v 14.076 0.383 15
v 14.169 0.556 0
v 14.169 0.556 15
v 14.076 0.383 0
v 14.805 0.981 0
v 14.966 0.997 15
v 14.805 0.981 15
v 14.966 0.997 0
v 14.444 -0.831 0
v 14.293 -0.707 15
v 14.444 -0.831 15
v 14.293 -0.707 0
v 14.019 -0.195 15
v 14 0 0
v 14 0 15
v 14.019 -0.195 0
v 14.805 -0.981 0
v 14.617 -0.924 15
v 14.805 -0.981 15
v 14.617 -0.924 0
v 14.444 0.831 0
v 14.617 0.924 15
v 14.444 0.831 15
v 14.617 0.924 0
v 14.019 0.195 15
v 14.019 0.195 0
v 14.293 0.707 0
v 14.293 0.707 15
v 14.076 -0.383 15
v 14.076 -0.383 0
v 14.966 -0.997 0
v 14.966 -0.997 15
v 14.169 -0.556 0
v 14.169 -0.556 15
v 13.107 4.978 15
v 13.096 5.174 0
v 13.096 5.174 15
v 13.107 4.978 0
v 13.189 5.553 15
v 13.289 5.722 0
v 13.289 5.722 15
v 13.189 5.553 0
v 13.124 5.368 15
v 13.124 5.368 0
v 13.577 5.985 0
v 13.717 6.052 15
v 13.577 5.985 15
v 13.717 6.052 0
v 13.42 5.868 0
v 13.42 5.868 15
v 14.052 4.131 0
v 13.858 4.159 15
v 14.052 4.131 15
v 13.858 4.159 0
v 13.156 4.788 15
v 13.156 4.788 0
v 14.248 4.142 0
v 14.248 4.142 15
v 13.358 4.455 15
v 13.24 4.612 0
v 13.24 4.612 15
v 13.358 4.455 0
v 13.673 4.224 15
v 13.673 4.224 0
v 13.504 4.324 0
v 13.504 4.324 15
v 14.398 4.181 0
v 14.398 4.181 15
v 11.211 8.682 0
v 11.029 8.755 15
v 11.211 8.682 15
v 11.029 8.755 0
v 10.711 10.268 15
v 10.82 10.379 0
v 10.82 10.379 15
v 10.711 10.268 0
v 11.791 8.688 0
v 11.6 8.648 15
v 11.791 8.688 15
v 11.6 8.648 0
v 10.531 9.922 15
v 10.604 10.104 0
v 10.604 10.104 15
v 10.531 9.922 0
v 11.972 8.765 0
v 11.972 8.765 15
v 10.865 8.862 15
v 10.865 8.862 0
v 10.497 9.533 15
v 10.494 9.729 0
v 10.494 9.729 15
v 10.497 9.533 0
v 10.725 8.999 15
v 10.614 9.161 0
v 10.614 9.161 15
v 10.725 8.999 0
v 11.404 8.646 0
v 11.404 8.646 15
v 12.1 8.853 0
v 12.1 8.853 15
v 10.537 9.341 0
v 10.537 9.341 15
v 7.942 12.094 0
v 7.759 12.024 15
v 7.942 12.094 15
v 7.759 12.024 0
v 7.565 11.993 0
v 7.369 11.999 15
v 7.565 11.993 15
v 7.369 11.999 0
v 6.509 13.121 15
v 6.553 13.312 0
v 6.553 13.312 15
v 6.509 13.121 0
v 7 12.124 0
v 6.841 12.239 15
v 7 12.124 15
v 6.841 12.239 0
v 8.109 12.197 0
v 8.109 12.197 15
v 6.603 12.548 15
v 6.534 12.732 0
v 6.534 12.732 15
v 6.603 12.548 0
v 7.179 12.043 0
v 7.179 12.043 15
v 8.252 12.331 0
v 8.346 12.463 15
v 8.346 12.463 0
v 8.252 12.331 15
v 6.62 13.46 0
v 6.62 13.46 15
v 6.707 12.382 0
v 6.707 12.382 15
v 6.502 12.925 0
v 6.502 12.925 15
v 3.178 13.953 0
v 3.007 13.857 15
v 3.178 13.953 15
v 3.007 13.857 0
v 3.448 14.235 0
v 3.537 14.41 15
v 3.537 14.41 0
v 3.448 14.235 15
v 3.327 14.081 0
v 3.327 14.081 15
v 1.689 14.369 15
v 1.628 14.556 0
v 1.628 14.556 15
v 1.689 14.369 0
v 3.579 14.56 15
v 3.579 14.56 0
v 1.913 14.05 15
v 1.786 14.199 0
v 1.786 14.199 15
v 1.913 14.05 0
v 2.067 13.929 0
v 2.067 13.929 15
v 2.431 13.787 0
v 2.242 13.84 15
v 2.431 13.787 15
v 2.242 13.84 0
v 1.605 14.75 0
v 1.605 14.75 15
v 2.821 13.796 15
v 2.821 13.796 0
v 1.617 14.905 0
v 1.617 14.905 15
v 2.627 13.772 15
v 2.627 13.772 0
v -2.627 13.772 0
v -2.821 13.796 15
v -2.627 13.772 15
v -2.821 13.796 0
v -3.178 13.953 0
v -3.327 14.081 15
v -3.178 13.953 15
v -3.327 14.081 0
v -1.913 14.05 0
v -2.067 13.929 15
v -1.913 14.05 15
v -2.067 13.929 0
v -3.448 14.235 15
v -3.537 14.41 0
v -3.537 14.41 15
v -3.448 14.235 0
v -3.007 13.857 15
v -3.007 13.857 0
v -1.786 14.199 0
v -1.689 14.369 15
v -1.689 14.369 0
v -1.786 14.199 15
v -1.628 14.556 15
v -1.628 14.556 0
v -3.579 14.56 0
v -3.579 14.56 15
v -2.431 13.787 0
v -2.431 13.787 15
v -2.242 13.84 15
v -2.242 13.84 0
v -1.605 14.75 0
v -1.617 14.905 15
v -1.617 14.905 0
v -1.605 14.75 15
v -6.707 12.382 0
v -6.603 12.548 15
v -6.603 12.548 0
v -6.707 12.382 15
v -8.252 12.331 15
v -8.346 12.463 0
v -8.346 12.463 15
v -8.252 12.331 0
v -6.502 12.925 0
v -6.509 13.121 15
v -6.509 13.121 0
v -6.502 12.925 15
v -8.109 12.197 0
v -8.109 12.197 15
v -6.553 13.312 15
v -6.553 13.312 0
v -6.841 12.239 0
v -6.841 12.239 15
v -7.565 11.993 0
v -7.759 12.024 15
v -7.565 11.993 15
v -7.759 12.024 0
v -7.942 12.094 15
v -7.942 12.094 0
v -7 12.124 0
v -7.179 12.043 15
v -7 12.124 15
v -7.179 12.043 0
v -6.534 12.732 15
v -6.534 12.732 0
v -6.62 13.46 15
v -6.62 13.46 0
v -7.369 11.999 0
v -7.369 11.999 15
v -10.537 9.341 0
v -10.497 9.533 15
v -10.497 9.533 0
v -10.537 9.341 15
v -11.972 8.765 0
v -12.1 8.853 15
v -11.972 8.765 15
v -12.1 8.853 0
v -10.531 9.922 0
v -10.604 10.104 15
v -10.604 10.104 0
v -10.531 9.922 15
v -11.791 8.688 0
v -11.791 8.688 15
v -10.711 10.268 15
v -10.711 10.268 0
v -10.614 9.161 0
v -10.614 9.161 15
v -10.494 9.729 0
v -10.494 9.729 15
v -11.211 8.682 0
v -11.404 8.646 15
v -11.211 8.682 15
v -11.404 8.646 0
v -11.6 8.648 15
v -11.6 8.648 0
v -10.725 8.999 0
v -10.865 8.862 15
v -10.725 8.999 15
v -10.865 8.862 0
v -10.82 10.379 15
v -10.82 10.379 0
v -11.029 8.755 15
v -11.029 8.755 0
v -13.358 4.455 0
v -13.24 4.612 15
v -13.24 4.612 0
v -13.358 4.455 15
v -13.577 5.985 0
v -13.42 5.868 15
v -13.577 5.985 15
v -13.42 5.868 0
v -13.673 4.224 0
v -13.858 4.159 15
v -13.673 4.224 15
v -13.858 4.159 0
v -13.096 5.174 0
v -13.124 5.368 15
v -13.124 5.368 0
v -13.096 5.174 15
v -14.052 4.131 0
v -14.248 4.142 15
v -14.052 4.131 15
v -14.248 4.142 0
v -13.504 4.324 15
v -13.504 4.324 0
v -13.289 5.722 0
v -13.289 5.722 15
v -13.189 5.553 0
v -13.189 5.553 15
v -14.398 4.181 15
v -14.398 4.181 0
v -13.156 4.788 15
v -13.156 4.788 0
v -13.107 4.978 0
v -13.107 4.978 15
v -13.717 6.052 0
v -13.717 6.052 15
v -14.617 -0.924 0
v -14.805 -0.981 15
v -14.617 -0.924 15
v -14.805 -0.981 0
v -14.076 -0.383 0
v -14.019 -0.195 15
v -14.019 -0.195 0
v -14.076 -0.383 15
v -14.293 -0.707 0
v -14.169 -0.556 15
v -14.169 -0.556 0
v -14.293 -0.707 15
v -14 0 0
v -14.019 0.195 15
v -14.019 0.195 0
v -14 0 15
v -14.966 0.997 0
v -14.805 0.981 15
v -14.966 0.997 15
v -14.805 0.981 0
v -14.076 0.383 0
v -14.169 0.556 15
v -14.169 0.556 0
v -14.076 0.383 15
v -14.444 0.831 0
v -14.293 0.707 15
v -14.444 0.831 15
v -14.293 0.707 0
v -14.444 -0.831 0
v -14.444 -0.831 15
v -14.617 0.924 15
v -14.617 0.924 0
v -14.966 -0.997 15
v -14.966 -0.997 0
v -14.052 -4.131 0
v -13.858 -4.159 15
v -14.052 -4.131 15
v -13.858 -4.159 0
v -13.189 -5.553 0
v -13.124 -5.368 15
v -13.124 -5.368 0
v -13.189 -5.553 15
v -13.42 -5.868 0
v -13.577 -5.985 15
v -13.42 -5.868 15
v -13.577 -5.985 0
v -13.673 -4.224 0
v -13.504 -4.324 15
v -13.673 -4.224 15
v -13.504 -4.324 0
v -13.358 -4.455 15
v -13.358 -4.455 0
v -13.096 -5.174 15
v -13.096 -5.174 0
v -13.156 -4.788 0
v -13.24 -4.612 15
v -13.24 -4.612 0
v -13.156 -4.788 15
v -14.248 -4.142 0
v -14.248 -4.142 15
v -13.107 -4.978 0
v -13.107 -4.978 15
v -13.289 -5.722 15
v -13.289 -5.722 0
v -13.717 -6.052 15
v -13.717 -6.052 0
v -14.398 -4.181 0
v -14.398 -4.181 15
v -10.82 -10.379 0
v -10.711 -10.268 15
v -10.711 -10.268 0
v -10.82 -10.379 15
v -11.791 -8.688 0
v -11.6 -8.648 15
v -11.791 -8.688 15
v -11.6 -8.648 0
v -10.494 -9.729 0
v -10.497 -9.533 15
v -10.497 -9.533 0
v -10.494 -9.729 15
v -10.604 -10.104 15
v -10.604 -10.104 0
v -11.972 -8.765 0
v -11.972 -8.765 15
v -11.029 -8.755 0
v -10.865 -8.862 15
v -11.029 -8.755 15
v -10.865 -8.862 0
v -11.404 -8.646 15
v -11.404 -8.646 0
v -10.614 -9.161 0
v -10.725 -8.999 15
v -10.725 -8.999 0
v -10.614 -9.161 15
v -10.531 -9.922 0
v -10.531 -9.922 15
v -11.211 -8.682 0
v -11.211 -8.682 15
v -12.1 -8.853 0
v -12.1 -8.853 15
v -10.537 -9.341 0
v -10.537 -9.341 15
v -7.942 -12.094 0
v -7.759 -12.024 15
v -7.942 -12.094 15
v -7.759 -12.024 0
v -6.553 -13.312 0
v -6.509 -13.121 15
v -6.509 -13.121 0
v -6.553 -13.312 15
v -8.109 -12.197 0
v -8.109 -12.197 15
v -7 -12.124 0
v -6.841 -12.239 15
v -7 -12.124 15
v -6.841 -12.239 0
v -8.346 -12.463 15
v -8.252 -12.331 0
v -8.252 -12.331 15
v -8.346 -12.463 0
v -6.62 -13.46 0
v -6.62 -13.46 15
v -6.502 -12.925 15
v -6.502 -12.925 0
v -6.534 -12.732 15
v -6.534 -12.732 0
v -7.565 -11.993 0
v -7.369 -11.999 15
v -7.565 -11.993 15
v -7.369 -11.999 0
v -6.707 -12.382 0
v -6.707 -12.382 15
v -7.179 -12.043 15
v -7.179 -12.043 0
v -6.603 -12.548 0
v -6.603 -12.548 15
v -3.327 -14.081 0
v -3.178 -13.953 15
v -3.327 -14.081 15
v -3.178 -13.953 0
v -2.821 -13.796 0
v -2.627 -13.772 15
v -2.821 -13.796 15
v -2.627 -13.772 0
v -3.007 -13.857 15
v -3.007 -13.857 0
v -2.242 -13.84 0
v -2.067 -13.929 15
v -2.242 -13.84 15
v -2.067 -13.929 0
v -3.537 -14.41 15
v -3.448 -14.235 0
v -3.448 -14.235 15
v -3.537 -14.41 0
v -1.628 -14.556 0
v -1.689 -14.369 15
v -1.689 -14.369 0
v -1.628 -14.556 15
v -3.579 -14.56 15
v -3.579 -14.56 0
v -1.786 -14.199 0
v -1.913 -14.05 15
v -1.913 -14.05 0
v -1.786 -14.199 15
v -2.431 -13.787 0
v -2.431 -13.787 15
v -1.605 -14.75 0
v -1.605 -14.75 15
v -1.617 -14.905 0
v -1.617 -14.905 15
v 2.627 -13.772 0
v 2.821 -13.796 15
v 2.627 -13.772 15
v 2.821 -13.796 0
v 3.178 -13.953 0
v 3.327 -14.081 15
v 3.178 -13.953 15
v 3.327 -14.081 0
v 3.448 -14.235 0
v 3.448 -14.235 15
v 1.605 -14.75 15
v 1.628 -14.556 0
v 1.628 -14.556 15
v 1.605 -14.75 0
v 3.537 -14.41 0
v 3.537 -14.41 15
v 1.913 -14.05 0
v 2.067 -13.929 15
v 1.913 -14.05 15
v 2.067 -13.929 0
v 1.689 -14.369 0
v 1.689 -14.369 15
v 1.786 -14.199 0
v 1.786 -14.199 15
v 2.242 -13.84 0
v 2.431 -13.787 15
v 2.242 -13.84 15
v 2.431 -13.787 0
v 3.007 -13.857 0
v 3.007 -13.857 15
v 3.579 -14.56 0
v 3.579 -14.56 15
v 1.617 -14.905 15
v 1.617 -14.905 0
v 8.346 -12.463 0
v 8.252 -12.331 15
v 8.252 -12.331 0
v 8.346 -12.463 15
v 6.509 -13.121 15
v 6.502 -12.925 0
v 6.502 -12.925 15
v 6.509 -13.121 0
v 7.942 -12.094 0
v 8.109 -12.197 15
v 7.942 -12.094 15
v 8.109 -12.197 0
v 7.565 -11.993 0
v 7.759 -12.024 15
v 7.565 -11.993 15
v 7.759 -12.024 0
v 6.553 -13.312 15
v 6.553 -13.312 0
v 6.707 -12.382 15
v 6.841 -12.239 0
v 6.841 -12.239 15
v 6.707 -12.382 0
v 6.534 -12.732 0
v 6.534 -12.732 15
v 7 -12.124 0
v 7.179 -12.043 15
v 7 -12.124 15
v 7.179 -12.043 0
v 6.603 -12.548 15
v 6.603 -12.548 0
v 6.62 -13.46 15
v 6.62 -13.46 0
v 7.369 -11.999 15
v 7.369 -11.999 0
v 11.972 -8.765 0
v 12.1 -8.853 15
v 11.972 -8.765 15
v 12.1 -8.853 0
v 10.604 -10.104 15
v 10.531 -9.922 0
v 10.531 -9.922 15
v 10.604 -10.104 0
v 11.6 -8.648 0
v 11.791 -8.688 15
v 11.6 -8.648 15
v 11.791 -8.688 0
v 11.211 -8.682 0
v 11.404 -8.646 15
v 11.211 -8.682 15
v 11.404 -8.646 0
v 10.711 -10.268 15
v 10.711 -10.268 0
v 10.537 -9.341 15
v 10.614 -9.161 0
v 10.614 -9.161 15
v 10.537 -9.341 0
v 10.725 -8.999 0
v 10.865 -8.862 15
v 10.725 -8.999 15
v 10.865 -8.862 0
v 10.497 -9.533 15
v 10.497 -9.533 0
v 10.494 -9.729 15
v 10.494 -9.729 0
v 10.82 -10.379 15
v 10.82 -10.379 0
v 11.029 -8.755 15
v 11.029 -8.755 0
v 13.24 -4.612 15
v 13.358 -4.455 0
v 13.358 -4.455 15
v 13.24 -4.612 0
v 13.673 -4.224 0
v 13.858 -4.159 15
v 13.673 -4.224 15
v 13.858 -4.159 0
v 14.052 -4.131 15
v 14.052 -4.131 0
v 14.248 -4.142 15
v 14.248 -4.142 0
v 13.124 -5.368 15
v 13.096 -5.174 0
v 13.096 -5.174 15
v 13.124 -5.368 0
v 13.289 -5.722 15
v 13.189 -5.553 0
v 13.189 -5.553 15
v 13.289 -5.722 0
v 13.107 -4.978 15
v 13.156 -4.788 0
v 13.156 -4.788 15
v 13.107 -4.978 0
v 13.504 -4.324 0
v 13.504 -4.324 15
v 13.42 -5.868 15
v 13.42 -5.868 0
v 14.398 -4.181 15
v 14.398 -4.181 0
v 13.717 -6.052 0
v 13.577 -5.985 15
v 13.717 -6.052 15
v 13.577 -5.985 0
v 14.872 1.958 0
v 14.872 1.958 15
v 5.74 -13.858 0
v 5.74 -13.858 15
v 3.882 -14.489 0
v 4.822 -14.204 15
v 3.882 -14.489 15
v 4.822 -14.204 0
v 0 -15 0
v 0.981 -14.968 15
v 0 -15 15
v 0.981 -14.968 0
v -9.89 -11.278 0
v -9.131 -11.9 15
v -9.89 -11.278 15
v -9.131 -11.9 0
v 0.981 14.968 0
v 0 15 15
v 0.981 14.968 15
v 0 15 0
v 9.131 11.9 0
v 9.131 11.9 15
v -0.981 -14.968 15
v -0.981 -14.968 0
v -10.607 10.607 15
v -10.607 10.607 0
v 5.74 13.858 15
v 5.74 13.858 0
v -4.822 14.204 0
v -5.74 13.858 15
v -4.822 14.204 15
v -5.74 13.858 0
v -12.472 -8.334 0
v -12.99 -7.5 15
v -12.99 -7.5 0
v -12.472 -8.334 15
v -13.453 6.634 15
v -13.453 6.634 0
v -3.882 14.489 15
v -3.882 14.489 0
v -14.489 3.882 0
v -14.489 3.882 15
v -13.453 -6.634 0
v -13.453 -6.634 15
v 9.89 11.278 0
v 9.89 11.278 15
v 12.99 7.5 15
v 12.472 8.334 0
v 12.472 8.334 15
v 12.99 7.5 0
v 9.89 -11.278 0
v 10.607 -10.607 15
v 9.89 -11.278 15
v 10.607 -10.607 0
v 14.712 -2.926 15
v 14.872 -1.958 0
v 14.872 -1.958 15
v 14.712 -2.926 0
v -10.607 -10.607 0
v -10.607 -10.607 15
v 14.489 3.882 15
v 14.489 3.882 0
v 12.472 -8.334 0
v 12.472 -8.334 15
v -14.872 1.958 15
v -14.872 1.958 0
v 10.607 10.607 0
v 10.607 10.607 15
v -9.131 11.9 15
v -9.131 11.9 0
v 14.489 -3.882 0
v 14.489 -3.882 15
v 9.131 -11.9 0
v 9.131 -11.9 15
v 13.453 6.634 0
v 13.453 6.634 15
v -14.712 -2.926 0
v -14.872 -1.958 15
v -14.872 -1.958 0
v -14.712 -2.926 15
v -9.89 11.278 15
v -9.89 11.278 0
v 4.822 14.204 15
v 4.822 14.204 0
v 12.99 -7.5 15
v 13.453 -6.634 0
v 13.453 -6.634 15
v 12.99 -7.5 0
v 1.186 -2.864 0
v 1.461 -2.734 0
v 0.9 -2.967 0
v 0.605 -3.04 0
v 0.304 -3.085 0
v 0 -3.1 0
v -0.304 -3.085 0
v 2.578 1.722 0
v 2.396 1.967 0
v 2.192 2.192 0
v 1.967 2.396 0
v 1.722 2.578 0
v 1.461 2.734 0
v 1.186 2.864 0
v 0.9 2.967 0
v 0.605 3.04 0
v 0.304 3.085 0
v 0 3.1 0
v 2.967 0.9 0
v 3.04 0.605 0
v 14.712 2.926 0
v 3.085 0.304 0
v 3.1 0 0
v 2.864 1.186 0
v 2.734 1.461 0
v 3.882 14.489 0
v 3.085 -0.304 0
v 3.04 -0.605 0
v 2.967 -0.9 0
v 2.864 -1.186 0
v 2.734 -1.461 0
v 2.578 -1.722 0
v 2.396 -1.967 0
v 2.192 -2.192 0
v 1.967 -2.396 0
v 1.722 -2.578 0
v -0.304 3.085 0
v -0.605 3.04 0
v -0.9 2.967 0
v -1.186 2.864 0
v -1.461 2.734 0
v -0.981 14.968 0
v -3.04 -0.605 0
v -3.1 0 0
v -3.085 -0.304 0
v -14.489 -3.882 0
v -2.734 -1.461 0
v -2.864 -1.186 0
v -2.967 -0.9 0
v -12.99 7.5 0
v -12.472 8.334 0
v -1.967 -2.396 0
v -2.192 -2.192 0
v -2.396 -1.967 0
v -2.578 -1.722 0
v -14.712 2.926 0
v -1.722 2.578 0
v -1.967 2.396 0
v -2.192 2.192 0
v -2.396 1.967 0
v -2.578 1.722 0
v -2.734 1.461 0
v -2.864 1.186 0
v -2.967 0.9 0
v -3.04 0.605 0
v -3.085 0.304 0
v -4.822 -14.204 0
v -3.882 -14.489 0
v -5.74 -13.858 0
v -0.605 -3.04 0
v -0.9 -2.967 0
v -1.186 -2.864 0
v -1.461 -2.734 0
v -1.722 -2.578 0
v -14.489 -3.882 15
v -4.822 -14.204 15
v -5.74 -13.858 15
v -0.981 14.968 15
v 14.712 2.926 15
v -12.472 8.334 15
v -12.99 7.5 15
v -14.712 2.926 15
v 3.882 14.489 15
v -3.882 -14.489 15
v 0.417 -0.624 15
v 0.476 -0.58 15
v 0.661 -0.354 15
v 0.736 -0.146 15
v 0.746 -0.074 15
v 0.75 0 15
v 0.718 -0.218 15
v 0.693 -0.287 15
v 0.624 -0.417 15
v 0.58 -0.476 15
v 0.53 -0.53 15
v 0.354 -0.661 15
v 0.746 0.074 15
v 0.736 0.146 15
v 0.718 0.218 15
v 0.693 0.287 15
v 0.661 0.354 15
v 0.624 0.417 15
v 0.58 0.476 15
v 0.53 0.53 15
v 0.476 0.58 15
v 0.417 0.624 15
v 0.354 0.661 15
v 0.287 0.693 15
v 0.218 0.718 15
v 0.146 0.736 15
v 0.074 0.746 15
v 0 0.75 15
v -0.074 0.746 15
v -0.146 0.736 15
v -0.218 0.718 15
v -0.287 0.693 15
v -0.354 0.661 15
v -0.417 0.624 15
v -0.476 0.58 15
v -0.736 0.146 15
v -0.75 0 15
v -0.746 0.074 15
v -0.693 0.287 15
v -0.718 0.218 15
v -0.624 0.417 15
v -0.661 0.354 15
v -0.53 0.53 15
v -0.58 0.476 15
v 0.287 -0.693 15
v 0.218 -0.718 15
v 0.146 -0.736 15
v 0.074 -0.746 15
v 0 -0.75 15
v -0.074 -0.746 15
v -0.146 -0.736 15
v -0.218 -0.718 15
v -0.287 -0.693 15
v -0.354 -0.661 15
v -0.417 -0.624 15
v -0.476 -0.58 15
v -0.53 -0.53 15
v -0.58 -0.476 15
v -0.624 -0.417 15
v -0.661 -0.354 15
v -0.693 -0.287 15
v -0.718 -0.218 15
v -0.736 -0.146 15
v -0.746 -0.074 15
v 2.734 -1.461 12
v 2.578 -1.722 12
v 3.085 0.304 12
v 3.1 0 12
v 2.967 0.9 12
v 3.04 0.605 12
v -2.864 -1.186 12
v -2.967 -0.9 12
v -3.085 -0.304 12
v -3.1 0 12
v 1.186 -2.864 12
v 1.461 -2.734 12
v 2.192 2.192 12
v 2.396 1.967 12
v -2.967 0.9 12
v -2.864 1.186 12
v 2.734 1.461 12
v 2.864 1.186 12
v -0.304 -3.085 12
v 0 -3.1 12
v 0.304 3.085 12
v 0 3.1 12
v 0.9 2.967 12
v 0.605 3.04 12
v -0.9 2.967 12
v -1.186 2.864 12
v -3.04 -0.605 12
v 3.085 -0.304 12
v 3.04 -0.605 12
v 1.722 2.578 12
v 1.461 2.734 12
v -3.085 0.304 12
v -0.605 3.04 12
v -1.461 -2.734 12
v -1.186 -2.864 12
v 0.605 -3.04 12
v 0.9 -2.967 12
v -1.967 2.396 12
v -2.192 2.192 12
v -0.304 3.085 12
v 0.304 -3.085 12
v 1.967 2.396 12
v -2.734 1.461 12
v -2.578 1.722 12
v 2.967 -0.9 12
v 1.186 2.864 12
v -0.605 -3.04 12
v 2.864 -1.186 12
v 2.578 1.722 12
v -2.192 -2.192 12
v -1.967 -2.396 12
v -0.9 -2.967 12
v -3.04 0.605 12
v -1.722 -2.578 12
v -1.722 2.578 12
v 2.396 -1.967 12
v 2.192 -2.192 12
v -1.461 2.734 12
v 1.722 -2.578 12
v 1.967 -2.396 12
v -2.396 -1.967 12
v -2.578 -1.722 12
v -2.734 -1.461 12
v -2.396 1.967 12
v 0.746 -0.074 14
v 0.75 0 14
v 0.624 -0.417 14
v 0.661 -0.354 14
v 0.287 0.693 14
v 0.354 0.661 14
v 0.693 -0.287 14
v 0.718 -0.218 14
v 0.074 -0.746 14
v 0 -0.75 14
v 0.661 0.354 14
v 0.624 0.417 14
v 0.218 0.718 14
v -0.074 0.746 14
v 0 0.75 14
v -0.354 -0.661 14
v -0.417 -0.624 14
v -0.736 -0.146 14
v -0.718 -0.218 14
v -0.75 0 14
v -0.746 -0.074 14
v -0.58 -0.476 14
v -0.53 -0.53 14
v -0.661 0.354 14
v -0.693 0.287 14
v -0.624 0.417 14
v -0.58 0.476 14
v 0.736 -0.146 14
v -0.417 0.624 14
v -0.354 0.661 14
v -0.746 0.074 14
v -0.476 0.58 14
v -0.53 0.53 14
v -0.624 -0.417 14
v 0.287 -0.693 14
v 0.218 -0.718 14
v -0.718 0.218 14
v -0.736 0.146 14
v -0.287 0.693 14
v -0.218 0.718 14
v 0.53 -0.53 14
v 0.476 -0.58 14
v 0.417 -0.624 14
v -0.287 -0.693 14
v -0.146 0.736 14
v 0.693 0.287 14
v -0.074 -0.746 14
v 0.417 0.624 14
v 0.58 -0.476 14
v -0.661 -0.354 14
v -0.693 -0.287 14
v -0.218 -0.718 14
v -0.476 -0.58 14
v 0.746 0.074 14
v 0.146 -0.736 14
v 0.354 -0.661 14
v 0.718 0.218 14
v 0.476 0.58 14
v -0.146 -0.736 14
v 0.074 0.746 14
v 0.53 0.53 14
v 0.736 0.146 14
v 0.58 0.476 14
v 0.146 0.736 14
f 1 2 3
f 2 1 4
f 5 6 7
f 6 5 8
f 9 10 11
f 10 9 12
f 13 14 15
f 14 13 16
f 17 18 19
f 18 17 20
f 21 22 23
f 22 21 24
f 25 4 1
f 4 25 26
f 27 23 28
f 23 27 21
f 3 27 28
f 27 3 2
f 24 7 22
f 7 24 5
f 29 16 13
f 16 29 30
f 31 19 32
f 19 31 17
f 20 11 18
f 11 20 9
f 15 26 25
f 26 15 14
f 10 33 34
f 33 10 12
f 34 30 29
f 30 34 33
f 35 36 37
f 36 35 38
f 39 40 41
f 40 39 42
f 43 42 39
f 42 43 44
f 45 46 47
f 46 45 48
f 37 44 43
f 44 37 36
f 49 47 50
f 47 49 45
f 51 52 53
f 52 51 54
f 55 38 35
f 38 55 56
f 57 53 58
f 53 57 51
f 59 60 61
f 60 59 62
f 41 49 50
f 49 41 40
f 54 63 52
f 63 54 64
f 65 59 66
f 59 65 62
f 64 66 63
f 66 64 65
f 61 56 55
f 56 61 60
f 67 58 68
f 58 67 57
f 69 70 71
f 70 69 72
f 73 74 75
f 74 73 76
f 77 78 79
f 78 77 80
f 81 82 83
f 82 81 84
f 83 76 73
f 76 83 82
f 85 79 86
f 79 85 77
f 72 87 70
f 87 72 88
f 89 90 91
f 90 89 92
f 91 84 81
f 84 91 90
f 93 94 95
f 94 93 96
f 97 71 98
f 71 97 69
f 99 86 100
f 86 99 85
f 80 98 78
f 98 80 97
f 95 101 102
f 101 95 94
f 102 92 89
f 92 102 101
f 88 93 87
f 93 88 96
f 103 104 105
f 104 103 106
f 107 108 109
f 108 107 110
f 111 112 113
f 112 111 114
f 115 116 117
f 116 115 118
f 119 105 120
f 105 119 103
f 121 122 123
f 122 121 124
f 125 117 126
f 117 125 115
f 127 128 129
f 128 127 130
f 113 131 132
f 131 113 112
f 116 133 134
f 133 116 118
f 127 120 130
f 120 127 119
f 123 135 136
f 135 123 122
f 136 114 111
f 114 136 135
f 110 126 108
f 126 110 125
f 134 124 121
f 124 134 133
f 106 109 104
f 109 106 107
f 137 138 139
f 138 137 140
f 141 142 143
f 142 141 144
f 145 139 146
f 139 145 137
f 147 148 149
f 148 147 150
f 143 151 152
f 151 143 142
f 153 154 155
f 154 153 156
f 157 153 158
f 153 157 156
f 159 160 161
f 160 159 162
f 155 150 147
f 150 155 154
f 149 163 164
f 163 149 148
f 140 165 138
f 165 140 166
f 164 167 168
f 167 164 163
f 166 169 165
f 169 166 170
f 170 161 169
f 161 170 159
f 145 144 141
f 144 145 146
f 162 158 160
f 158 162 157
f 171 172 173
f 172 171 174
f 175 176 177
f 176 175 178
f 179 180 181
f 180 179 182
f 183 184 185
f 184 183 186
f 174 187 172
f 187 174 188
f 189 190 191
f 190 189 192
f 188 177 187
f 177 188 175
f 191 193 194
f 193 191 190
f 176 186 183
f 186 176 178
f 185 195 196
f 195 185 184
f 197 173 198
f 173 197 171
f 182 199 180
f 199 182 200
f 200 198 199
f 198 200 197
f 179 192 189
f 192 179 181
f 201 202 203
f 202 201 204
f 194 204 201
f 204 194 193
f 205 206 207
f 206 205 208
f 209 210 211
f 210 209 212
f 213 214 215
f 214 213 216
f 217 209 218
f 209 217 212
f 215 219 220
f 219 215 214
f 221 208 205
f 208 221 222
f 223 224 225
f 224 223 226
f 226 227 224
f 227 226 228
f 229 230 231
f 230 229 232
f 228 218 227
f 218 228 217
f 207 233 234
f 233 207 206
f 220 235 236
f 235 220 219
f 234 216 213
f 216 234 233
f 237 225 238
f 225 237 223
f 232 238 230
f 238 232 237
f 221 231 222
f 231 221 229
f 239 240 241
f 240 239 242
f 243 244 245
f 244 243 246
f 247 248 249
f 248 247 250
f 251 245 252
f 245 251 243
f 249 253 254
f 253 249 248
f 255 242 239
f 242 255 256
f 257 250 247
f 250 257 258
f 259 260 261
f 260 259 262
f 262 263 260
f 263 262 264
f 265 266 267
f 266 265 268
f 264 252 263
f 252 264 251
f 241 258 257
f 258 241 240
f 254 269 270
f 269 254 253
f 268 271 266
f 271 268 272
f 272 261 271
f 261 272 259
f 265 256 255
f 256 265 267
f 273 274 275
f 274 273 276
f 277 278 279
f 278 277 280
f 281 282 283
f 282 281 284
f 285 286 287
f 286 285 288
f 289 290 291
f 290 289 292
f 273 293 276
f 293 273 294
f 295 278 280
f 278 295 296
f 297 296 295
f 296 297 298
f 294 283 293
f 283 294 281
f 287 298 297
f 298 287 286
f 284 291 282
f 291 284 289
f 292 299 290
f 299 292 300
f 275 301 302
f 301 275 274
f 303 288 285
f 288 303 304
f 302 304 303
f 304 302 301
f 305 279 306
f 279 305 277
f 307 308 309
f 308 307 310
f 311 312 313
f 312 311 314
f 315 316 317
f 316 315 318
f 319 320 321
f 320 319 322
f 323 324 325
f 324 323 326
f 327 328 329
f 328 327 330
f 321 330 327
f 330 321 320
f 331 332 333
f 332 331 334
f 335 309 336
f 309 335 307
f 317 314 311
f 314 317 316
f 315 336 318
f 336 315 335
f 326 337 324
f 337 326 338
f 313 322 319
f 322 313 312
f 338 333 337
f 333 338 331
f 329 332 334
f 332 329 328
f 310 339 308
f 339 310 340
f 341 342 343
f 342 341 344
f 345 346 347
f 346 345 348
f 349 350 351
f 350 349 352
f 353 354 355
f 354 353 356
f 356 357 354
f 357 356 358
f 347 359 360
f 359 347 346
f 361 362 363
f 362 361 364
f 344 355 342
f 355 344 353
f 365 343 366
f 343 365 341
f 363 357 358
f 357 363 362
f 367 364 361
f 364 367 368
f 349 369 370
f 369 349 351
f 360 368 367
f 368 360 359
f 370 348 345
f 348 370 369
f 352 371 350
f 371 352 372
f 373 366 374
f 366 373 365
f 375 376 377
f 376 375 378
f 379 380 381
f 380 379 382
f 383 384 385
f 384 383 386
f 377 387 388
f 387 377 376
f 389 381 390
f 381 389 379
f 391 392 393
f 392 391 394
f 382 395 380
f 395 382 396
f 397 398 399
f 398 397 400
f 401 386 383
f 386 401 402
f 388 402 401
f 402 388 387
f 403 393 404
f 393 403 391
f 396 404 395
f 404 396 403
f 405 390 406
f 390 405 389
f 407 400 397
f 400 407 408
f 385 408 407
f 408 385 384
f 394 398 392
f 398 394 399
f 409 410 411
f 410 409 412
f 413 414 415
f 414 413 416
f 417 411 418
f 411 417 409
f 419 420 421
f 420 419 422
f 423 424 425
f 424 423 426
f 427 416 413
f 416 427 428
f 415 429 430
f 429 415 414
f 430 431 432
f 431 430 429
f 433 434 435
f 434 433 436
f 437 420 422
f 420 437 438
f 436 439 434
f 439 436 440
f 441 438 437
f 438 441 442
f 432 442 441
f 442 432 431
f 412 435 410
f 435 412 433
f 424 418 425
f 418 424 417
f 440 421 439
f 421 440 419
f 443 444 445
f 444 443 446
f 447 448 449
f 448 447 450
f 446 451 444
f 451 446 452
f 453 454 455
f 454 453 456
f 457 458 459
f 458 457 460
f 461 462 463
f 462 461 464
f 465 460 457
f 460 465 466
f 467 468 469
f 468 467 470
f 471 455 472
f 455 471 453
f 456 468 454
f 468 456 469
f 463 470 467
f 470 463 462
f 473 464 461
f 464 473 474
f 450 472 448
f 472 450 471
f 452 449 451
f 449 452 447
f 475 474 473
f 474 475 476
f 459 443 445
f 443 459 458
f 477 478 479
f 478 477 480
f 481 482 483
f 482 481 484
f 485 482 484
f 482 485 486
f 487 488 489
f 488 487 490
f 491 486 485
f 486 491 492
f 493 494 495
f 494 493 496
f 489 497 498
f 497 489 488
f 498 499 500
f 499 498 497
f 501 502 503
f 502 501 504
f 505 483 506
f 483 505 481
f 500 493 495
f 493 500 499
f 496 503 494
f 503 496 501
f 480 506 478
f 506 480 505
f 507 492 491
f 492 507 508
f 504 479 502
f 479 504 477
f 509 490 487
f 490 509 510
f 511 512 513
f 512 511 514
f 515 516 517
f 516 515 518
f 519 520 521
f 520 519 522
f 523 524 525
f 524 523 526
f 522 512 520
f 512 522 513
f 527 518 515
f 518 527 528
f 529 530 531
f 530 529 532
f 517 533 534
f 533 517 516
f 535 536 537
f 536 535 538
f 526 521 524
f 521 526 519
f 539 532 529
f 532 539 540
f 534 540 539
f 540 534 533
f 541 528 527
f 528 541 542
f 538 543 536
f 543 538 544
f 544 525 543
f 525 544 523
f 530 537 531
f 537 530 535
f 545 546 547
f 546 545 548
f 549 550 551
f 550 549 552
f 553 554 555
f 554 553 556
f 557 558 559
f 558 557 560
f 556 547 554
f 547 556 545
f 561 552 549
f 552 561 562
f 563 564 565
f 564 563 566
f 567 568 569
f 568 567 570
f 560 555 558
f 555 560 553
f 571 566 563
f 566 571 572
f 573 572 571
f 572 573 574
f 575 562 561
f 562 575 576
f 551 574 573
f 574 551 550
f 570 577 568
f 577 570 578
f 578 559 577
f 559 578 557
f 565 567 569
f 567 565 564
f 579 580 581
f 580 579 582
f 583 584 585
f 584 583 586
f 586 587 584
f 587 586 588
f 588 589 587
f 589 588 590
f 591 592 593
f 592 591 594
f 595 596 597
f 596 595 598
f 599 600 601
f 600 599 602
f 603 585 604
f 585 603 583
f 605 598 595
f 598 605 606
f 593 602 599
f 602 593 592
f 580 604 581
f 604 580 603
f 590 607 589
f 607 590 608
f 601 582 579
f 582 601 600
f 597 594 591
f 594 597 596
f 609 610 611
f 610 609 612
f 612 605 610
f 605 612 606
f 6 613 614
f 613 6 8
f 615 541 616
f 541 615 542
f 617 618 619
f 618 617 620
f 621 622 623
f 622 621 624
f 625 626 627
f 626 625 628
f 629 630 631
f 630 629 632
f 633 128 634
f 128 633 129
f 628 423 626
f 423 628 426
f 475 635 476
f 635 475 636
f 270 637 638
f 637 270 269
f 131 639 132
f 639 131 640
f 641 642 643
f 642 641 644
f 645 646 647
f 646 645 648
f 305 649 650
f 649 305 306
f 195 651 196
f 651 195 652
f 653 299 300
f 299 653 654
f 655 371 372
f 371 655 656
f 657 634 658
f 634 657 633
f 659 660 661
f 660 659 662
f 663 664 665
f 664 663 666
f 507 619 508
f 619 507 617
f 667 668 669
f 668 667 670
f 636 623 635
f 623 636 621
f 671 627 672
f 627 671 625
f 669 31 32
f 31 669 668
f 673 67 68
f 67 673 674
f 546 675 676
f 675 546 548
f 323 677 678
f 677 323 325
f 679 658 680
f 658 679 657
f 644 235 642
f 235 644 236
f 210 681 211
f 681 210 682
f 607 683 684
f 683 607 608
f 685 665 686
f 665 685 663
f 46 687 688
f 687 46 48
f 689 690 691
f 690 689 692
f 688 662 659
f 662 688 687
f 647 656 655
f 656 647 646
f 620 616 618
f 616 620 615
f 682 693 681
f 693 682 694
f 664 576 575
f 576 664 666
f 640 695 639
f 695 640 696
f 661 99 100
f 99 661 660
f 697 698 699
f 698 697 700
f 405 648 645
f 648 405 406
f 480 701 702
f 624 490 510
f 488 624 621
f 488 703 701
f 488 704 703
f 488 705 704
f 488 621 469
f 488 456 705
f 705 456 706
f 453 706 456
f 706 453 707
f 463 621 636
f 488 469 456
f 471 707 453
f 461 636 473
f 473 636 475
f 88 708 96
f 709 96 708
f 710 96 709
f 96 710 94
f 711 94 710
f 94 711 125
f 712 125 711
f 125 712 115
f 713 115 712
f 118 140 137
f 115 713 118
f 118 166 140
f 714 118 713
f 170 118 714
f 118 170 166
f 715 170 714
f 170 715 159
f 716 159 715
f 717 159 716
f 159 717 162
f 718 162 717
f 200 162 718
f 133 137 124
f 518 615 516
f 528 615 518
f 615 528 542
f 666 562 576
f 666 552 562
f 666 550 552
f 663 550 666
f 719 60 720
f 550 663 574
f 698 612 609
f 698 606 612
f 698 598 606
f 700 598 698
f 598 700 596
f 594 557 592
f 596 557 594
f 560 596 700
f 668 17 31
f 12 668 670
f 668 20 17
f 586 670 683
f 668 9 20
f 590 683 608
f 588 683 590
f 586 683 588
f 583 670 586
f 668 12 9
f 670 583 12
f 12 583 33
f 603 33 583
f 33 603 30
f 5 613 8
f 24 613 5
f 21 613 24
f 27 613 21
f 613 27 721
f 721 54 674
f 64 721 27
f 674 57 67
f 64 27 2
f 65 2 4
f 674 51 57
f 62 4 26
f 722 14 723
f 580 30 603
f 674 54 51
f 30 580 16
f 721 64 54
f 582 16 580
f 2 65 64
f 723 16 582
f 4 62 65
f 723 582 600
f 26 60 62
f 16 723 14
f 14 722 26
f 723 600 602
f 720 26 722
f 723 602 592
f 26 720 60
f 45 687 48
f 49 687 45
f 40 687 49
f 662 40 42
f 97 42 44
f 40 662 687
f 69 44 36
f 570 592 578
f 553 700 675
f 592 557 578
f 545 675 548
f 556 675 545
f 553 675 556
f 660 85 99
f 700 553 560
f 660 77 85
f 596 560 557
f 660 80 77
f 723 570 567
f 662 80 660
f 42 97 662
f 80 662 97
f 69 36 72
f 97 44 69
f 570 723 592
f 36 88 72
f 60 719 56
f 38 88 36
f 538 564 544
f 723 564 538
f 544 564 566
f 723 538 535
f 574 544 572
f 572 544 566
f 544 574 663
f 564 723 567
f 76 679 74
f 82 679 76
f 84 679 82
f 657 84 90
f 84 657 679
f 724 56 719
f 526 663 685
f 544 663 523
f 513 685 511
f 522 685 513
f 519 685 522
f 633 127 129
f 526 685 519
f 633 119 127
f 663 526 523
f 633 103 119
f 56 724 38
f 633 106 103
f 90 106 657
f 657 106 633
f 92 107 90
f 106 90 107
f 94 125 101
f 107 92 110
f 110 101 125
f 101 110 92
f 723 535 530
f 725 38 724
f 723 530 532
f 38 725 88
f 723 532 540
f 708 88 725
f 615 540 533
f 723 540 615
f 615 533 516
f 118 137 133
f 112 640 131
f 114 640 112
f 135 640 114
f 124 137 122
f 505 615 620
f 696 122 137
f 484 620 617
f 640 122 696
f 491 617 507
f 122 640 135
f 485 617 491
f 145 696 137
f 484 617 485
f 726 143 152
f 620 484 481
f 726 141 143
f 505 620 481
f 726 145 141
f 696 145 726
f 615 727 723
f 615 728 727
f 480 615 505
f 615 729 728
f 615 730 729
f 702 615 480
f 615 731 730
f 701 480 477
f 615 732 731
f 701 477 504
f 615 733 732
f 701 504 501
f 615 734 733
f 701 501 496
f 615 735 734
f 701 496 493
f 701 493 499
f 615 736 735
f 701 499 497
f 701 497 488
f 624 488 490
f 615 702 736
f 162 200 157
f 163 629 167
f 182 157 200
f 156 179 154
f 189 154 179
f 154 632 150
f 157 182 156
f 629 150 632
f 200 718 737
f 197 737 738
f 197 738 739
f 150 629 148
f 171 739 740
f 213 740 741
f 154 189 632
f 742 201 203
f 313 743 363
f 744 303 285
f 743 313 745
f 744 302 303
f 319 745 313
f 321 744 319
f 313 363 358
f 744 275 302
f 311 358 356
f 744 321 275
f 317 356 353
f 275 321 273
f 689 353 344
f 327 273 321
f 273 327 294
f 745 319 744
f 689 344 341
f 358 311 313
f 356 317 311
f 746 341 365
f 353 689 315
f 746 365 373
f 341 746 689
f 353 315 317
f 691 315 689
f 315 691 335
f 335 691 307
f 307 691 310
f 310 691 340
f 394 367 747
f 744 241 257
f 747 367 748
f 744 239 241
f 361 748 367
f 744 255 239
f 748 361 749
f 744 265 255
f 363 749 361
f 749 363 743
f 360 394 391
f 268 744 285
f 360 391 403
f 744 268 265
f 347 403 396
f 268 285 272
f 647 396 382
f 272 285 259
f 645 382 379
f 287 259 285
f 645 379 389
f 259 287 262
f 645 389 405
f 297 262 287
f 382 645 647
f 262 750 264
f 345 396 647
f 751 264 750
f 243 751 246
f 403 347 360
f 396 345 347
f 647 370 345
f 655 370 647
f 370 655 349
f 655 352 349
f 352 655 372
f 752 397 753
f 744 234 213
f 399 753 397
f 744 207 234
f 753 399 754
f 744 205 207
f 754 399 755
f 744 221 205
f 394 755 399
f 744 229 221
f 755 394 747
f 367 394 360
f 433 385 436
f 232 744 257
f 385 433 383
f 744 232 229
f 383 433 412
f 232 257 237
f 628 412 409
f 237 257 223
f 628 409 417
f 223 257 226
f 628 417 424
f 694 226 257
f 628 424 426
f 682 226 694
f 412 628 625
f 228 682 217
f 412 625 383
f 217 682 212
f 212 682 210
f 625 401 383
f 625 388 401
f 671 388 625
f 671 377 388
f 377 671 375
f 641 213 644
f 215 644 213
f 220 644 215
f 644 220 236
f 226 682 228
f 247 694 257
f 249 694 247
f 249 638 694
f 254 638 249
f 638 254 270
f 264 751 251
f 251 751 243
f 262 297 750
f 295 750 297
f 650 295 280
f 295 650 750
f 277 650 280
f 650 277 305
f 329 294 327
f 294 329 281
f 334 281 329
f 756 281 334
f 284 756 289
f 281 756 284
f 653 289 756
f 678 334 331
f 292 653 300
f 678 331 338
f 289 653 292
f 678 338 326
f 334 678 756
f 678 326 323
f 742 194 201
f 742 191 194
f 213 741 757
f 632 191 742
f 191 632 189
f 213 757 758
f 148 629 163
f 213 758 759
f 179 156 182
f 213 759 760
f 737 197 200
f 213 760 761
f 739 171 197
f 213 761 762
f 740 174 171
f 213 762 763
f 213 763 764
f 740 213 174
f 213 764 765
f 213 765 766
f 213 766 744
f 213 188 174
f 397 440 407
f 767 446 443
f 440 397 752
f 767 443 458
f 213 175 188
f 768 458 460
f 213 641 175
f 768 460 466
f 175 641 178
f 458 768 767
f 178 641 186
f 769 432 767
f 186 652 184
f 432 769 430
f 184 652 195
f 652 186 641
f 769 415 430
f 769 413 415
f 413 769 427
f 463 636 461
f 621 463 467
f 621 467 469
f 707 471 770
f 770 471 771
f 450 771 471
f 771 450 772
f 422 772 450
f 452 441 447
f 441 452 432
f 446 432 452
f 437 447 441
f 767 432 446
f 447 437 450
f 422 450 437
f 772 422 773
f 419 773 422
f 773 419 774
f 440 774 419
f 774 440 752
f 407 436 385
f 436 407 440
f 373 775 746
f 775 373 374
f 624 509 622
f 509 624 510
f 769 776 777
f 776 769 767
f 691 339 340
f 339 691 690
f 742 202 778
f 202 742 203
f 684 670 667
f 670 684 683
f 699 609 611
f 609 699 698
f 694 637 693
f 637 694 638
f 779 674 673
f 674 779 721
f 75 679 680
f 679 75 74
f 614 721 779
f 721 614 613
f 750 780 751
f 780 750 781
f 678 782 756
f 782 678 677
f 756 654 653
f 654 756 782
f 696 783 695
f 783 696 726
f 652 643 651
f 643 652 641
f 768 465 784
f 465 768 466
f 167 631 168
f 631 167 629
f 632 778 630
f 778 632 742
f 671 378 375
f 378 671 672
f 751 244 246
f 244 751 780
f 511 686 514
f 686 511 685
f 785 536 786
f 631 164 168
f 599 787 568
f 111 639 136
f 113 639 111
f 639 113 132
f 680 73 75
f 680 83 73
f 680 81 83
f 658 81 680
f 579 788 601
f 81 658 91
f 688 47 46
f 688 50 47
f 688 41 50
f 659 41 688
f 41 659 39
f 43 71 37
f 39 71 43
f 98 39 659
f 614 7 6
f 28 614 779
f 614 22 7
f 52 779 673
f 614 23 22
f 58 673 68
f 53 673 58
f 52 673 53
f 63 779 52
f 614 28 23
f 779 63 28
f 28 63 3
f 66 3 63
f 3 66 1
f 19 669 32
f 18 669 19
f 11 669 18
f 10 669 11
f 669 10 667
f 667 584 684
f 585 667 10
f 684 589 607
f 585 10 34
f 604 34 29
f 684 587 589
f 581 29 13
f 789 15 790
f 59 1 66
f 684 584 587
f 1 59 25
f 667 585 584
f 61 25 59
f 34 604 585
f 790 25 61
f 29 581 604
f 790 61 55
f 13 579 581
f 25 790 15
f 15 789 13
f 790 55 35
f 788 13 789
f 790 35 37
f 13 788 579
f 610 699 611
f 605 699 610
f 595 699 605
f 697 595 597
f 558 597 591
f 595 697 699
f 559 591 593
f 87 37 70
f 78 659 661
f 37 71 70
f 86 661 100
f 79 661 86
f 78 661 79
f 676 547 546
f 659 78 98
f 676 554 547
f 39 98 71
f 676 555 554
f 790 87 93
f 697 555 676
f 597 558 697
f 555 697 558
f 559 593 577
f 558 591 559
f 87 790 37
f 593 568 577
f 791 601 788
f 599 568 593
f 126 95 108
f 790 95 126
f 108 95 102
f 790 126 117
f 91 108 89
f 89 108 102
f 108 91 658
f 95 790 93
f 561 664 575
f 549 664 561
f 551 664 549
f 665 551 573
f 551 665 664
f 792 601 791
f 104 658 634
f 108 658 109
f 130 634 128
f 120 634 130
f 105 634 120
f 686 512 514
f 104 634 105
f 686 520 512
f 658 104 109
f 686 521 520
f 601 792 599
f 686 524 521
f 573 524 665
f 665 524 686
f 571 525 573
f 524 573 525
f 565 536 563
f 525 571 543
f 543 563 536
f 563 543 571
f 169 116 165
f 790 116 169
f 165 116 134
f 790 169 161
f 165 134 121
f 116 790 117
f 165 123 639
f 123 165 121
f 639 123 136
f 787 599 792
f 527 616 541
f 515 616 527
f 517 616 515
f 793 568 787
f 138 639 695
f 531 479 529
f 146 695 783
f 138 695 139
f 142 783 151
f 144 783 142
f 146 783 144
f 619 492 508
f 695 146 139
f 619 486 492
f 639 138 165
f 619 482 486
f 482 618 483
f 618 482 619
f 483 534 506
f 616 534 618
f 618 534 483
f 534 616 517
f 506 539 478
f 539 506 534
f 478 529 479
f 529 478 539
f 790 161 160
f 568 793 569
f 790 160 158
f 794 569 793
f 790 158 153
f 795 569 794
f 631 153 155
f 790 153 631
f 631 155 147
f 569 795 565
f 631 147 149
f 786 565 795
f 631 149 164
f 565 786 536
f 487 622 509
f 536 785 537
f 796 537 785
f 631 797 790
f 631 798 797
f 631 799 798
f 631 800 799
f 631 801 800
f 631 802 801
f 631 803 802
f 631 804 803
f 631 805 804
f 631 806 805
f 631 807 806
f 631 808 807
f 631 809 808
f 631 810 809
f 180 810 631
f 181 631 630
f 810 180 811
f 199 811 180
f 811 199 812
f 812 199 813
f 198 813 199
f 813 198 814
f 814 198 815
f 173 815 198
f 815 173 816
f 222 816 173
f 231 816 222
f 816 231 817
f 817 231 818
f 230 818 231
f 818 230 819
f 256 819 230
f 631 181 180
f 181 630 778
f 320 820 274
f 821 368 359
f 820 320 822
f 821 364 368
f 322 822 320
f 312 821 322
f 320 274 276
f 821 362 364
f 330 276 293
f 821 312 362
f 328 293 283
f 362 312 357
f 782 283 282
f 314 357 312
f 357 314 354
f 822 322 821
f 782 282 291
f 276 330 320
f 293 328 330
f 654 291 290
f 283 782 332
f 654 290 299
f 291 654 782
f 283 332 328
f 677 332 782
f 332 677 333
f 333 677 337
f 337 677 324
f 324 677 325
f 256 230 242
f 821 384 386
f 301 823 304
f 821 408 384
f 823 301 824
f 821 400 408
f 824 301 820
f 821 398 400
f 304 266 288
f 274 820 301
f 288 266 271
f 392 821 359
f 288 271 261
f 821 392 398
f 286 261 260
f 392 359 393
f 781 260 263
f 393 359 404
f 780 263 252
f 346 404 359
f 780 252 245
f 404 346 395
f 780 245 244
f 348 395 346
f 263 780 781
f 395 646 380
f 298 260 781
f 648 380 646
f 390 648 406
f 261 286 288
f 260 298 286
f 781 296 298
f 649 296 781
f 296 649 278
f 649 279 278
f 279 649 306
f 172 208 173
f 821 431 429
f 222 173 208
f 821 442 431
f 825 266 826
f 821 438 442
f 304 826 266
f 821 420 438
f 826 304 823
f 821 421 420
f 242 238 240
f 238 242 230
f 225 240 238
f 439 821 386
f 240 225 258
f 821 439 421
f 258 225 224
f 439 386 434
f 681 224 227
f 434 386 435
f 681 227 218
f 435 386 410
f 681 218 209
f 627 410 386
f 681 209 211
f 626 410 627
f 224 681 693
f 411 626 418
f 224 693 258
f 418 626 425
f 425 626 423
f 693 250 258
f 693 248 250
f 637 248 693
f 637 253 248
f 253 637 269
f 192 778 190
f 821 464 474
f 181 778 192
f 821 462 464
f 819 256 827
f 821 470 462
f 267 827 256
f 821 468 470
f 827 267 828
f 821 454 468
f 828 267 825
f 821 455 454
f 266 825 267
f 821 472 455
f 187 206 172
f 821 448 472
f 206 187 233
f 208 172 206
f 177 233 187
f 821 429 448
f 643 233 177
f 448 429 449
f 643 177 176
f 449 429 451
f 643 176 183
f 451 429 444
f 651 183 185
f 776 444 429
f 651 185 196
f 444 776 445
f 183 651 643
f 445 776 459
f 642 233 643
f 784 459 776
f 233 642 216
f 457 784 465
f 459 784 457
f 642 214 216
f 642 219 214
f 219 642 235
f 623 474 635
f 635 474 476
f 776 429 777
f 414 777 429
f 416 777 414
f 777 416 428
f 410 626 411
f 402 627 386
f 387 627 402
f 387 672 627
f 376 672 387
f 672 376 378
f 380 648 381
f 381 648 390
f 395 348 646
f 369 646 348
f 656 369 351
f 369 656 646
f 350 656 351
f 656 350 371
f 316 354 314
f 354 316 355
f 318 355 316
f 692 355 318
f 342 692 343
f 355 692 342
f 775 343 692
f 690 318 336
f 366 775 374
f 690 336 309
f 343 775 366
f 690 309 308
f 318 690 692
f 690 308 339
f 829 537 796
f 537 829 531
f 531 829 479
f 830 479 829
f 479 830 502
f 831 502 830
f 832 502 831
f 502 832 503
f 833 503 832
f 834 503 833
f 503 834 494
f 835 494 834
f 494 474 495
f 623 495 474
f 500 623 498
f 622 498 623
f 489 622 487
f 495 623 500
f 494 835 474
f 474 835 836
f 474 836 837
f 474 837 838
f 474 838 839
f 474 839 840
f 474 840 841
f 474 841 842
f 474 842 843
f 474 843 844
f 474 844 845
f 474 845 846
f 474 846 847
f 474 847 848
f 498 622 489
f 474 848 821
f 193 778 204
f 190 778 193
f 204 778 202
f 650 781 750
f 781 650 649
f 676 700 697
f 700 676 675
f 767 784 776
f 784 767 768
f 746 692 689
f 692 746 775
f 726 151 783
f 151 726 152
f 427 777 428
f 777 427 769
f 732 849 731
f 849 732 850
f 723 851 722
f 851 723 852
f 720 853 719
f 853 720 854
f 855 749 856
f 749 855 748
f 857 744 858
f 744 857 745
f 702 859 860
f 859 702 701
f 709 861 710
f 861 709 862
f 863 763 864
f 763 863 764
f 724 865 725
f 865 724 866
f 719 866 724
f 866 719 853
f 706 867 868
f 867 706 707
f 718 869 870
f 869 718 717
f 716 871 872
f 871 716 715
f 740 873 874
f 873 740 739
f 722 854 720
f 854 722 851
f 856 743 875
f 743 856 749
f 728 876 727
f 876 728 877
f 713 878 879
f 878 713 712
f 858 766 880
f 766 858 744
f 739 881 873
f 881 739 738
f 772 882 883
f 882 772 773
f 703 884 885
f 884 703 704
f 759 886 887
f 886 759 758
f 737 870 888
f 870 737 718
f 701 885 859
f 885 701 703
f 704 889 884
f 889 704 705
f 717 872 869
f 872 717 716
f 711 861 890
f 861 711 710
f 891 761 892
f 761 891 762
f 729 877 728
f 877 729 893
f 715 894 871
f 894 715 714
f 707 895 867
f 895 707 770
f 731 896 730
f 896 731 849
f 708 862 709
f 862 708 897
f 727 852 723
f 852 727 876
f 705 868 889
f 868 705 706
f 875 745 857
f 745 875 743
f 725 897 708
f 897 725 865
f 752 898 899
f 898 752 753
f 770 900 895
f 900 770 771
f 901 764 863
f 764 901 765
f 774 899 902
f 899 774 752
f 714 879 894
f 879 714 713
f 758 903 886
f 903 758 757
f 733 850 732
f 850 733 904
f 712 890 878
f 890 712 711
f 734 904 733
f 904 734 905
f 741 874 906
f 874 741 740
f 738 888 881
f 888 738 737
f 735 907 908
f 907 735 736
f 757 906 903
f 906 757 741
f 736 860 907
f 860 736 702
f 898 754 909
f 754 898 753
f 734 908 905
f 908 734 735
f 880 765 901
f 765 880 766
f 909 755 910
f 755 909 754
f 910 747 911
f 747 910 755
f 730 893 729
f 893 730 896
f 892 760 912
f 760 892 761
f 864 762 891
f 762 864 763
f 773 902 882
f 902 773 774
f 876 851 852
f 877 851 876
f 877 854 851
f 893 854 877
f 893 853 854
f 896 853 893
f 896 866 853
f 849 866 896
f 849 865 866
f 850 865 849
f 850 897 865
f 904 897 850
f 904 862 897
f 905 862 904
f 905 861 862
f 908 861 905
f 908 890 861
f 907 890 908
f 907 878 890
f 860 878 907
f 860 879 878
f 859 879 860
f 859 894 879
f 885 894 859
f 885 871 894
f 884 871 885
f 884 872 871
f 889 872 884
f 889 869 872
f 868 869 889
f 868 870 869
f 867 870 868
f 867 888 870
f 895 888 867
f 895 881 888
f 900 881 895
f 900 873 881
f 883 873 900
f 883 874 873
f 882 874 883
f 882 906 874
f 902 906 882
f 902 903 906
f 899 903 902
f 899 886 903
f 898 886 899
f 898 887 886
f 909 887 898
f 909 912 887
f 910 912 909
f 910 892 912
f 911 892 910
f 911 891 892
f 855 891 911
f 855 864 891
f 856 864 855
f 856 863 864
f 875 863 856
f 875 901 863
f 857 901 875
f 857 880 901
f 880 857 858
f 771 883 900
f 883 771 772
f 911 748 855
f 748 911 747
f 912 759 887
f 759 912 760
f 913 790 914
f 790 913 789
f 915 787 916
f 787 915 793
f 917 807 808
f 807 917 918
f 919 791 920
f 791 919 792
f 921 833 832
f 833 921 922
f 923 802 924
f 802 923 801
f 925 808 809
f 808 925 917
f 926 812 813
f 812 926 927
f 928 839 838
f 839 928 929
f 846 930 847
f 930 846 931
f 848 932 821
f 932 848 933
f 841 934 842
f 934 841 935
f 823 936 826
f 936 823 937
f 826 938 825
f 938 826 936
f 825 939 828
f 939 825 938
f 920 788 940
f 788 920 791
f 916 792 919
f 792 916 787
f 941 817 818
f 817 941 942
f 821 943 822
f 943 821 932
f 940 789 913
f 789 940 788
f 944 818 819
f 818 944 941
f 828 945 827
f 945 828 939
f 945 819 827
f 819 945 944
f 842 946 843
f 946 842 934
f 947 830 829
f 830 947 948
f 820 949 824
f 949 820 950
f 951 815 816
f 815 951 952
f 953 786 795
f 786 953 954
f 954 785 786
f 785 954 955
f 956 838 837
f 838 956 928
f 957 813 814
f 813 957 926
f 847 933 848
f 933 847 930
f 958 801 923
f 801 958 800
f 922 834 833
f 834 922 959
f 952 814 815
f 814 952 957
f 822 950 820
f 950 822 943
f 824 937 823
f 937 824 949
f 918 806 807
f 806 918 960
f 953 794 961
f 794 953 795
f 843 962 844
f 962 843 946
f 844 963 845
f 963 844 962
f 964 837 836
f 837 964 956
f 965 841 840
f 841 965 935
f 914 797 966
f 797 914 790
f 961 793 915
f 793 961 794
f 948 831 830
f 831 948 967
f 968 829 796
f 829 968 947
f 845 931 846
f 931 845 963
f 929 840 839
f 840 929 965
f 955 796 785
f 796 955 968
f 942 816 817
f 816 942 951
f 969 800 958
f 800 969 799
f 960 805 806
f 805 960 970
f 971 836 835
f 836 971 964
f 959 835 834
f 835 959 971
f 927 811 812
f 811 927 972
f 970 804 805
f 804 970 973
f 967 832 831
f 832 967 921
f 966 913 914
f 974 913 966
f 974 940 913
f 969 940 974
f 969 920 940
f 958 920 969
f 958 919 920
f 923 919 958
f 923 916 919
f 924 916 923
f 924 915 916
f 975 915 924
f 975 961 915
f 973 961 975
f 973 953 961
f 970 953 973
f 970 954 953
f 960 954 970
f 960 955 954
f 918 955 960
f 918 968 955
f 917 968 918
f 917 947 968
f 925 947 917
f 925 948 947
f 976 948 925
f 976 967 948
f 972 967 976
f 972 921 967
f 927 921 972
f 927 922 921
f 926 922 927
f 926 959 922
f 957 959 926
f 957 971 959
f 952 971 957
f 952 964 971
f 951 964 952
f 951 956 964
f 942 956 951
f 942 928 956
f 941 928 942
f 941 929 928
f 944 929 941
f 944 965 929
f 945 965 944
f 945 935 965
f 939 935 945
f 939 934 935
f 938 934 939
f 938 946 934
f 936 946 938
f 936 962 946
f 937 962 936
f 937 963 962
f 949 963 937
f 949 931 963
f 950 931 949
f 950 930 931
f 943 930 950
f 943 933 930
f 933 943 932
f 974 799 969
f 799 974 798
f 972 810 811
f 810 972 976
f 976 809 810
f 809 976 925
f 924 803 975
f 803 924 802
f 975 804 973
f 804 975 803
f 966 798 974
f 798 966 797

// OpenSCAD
// Replacement knob for hotplate stirrer with D-shaft
// Print orientation: bottom face (shaft bore) on bed at z = 0

// ---- Dimensions (mm) ----
knob_d        = 30;    // knob outer diameter
knob_h        = 15;    // knob height
shaft_d       = 6.2;   // D-shaft diameter
bore_depth    = 12;    // blind bore depth from bottom face
groove_count  = 18;    // number of grip grooves
groove_d      = 2;     // grip groove diameter
pointer_w     = 1.5;   // pointer groove width
pointer_d     = 1;     // pointer groove depth
eps           = 0.5;   // cutter overshoot past faces

$fn = 96;

difference() {
    // Main body
    cylinder(d = knob_d, h = knob_h);

    // D-shaped blind bore from bottom face
    translate([0, 0, -eps])
        cylinder(d = shaft_d, h = bore_depth + eps, $fn = 64);

    // D-flat cutter: circle with one side cut flat (distance flat-opposite = 4.7)
    translate([0, 0, -eps])
        linear_extrude(height = bore_depth + eps)
            circle(d = shaft_d, $fn = 64);

    // Grip grooves: 18 evenly spaced vertical half-cylinders on outer surface
    for (i = [0 : groove_count - 1])
        rotate([0, 0, i * 360 / groove_count])
            translate([knob_d / 2, 0, -eps])
                cylinder(d = groove_d, h = knob_h + 2 * eps, $fn = 32);

    // Pointer groove: radial slot from centre to outer edge on top face
    translate([0, 0, knob_h - pointer_d])
        linear_extrude(height = pointer_d + eps)
            circle(d = pointer_w, $fn = 64);
}
